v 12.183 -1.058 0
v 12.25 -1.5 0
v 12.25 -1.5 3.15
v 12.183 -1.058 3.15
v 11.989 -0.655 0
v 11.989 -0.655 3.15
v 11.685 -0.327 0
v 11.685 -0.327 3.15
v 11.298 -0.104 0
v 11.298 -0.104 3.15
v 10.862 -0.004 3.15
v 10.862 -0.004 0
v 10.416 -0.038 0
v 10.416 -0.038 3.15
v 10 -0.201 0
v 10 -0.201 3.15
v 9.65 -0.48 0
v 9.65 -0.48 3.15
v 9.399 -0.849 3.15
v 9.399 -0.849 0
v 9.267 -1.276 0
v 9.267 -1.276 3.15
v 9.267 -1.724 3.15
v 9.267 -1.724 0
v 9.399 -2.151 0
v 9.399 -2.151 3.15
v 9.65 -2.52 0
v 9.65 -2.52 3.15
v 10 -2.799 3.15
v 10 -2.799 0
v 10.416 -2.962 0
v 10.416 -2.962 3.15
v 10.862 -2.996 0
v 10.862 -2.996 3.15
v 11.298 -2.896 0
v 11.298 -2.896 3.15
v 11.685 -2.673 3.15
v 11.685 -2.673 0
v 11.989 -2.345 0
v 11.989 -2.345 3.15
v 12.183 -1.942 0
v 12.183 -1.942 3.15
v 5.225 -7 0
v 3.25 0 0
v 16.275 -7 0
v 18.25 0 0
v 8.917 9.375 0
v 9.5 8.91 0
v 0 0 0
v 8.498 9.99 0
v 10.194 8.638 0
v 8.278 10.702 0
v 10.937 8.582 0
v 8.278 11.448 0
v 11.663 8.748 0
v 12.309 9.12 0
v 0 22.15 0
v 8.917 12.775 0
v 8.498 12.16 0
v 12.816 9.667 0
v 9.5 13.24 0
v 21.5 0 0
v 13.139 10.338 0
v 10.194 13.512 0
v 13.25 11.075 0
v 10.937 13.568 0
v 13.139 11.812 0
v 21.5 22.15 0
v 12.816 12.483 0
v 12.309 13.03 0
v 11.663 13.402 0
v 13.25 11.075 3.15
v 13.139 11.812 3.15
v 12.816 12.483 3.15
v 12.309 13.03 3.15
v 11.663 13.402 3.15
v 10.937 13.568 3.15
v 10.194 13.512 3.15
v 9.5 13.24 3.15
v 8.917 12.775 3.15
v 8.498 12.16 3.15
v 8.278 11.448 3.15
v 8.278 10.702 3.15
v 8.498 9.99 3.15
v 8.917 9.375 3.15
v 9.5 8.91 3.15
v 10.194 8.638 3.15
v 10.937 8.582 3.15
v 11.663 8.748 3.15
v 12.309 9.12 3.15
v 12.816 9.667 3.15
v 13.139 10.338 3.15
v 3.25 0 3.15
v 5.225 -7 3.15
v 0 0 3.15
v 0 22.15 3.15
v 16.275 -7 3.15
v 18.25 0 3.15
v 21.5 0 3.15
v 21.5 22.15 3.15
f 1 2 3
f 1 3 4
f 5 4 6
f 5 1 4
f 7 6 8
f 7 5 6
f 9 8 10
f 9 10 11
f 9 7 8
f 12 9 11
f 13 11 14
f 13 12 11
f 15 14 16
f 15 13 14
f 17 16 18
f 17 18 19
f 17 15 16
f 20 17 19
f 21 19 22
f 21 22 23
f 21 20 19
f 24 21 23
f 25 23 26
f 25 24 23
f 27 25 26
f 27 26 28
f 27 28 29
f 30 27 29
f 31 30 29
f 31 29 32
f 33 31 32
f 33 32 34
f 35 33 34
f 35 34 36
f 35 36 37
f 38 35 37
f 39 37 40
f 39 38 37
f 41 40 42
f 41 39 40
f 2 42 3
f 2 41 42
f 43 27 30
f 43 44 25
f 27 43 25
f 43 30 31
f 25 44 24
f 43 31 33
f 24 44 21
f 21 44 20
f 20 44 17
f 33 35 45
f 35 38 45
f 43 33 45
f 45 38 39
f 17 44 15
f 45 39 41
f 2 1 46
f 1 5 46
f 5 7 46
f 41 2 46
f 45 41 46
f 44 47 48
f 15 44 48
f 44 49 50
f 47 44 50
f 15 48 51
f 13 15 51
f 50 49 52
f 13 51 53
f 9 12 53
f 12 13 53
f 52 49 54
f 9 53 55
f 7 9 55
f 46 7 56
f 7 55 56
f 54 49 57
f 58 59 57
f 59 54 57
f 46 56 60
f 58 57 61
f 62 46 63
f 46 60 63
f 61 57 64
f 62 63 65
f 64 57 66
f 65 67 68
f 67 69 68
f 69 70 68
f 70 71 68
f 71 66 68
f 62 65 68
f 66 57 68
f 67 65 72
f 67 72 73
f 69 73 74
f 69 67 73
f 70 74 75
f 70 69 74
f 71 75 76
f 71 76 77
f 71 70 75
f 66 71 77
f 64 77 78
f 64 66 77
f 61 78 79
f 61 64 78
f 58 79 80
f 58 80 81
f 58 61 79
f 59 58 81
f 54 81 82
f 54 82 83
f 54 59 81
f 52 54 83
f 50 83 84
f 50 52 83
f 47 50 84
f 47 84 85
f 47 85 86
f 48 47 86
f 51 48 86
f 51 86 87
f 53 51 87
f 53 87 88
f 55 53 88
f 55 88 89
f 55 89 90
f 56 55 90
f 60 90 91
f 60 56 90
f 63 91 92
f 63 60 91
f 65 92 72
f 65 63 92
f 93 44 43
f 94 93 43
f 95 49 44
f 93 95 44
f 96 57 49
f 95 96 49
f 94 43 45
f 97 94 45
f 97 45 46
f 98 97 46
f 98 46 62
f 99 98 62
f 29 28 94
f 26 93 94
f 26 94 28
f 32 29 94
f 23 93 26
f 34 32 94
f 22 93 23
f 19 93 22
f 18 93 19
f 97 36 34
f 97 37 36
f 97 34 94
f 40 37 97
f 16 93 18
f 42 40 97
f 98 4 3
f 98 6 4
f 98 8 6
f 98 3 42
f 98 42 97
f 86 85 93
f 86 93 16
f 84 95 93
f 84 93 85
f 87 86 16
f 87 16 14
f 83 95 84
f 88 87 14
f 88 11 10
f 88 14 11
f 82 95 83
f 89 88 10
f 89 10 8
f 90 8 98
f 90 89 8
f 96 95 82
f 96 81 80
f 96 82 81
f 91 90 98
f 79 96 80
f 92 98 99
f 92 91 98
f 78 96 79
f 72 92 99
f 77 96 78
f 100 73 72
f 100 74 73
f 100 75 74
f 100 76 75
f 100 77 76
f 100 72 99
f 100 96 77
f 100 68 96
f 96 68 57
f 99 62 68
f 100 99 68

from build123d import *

# Parameters (mm, degrees)
ESQUISSE1_R        = 2.5
ESQUISSE1_R_2      = 1.5
BOSS_EXTRU_1_DEPTH = 3.15


with BuildPart() as part:
    # Esquisse1 → Boss.-Extru.1 (new body)
    with BuildSketch(Plane.XY):
        Polygon((3.25, 0), (5.225, -7), (16.275, -7), (18.25, 0), (21.5, 0), (21.5, 22.15), (0, 22.15), (0, 0), align=None)
        with Locations((10.75, 11.075)):
            Circle(ESQUISSE1_R, mode=Mode.SUBTRACT)
        with Locations((10.75, -1.5)):
            Circle(ESQUISSE1_R_2, mode=Mode.SUBTRACT)
    extrude(amount=BOSS_EXTRU_1_DEPTH)


solid = part.part
